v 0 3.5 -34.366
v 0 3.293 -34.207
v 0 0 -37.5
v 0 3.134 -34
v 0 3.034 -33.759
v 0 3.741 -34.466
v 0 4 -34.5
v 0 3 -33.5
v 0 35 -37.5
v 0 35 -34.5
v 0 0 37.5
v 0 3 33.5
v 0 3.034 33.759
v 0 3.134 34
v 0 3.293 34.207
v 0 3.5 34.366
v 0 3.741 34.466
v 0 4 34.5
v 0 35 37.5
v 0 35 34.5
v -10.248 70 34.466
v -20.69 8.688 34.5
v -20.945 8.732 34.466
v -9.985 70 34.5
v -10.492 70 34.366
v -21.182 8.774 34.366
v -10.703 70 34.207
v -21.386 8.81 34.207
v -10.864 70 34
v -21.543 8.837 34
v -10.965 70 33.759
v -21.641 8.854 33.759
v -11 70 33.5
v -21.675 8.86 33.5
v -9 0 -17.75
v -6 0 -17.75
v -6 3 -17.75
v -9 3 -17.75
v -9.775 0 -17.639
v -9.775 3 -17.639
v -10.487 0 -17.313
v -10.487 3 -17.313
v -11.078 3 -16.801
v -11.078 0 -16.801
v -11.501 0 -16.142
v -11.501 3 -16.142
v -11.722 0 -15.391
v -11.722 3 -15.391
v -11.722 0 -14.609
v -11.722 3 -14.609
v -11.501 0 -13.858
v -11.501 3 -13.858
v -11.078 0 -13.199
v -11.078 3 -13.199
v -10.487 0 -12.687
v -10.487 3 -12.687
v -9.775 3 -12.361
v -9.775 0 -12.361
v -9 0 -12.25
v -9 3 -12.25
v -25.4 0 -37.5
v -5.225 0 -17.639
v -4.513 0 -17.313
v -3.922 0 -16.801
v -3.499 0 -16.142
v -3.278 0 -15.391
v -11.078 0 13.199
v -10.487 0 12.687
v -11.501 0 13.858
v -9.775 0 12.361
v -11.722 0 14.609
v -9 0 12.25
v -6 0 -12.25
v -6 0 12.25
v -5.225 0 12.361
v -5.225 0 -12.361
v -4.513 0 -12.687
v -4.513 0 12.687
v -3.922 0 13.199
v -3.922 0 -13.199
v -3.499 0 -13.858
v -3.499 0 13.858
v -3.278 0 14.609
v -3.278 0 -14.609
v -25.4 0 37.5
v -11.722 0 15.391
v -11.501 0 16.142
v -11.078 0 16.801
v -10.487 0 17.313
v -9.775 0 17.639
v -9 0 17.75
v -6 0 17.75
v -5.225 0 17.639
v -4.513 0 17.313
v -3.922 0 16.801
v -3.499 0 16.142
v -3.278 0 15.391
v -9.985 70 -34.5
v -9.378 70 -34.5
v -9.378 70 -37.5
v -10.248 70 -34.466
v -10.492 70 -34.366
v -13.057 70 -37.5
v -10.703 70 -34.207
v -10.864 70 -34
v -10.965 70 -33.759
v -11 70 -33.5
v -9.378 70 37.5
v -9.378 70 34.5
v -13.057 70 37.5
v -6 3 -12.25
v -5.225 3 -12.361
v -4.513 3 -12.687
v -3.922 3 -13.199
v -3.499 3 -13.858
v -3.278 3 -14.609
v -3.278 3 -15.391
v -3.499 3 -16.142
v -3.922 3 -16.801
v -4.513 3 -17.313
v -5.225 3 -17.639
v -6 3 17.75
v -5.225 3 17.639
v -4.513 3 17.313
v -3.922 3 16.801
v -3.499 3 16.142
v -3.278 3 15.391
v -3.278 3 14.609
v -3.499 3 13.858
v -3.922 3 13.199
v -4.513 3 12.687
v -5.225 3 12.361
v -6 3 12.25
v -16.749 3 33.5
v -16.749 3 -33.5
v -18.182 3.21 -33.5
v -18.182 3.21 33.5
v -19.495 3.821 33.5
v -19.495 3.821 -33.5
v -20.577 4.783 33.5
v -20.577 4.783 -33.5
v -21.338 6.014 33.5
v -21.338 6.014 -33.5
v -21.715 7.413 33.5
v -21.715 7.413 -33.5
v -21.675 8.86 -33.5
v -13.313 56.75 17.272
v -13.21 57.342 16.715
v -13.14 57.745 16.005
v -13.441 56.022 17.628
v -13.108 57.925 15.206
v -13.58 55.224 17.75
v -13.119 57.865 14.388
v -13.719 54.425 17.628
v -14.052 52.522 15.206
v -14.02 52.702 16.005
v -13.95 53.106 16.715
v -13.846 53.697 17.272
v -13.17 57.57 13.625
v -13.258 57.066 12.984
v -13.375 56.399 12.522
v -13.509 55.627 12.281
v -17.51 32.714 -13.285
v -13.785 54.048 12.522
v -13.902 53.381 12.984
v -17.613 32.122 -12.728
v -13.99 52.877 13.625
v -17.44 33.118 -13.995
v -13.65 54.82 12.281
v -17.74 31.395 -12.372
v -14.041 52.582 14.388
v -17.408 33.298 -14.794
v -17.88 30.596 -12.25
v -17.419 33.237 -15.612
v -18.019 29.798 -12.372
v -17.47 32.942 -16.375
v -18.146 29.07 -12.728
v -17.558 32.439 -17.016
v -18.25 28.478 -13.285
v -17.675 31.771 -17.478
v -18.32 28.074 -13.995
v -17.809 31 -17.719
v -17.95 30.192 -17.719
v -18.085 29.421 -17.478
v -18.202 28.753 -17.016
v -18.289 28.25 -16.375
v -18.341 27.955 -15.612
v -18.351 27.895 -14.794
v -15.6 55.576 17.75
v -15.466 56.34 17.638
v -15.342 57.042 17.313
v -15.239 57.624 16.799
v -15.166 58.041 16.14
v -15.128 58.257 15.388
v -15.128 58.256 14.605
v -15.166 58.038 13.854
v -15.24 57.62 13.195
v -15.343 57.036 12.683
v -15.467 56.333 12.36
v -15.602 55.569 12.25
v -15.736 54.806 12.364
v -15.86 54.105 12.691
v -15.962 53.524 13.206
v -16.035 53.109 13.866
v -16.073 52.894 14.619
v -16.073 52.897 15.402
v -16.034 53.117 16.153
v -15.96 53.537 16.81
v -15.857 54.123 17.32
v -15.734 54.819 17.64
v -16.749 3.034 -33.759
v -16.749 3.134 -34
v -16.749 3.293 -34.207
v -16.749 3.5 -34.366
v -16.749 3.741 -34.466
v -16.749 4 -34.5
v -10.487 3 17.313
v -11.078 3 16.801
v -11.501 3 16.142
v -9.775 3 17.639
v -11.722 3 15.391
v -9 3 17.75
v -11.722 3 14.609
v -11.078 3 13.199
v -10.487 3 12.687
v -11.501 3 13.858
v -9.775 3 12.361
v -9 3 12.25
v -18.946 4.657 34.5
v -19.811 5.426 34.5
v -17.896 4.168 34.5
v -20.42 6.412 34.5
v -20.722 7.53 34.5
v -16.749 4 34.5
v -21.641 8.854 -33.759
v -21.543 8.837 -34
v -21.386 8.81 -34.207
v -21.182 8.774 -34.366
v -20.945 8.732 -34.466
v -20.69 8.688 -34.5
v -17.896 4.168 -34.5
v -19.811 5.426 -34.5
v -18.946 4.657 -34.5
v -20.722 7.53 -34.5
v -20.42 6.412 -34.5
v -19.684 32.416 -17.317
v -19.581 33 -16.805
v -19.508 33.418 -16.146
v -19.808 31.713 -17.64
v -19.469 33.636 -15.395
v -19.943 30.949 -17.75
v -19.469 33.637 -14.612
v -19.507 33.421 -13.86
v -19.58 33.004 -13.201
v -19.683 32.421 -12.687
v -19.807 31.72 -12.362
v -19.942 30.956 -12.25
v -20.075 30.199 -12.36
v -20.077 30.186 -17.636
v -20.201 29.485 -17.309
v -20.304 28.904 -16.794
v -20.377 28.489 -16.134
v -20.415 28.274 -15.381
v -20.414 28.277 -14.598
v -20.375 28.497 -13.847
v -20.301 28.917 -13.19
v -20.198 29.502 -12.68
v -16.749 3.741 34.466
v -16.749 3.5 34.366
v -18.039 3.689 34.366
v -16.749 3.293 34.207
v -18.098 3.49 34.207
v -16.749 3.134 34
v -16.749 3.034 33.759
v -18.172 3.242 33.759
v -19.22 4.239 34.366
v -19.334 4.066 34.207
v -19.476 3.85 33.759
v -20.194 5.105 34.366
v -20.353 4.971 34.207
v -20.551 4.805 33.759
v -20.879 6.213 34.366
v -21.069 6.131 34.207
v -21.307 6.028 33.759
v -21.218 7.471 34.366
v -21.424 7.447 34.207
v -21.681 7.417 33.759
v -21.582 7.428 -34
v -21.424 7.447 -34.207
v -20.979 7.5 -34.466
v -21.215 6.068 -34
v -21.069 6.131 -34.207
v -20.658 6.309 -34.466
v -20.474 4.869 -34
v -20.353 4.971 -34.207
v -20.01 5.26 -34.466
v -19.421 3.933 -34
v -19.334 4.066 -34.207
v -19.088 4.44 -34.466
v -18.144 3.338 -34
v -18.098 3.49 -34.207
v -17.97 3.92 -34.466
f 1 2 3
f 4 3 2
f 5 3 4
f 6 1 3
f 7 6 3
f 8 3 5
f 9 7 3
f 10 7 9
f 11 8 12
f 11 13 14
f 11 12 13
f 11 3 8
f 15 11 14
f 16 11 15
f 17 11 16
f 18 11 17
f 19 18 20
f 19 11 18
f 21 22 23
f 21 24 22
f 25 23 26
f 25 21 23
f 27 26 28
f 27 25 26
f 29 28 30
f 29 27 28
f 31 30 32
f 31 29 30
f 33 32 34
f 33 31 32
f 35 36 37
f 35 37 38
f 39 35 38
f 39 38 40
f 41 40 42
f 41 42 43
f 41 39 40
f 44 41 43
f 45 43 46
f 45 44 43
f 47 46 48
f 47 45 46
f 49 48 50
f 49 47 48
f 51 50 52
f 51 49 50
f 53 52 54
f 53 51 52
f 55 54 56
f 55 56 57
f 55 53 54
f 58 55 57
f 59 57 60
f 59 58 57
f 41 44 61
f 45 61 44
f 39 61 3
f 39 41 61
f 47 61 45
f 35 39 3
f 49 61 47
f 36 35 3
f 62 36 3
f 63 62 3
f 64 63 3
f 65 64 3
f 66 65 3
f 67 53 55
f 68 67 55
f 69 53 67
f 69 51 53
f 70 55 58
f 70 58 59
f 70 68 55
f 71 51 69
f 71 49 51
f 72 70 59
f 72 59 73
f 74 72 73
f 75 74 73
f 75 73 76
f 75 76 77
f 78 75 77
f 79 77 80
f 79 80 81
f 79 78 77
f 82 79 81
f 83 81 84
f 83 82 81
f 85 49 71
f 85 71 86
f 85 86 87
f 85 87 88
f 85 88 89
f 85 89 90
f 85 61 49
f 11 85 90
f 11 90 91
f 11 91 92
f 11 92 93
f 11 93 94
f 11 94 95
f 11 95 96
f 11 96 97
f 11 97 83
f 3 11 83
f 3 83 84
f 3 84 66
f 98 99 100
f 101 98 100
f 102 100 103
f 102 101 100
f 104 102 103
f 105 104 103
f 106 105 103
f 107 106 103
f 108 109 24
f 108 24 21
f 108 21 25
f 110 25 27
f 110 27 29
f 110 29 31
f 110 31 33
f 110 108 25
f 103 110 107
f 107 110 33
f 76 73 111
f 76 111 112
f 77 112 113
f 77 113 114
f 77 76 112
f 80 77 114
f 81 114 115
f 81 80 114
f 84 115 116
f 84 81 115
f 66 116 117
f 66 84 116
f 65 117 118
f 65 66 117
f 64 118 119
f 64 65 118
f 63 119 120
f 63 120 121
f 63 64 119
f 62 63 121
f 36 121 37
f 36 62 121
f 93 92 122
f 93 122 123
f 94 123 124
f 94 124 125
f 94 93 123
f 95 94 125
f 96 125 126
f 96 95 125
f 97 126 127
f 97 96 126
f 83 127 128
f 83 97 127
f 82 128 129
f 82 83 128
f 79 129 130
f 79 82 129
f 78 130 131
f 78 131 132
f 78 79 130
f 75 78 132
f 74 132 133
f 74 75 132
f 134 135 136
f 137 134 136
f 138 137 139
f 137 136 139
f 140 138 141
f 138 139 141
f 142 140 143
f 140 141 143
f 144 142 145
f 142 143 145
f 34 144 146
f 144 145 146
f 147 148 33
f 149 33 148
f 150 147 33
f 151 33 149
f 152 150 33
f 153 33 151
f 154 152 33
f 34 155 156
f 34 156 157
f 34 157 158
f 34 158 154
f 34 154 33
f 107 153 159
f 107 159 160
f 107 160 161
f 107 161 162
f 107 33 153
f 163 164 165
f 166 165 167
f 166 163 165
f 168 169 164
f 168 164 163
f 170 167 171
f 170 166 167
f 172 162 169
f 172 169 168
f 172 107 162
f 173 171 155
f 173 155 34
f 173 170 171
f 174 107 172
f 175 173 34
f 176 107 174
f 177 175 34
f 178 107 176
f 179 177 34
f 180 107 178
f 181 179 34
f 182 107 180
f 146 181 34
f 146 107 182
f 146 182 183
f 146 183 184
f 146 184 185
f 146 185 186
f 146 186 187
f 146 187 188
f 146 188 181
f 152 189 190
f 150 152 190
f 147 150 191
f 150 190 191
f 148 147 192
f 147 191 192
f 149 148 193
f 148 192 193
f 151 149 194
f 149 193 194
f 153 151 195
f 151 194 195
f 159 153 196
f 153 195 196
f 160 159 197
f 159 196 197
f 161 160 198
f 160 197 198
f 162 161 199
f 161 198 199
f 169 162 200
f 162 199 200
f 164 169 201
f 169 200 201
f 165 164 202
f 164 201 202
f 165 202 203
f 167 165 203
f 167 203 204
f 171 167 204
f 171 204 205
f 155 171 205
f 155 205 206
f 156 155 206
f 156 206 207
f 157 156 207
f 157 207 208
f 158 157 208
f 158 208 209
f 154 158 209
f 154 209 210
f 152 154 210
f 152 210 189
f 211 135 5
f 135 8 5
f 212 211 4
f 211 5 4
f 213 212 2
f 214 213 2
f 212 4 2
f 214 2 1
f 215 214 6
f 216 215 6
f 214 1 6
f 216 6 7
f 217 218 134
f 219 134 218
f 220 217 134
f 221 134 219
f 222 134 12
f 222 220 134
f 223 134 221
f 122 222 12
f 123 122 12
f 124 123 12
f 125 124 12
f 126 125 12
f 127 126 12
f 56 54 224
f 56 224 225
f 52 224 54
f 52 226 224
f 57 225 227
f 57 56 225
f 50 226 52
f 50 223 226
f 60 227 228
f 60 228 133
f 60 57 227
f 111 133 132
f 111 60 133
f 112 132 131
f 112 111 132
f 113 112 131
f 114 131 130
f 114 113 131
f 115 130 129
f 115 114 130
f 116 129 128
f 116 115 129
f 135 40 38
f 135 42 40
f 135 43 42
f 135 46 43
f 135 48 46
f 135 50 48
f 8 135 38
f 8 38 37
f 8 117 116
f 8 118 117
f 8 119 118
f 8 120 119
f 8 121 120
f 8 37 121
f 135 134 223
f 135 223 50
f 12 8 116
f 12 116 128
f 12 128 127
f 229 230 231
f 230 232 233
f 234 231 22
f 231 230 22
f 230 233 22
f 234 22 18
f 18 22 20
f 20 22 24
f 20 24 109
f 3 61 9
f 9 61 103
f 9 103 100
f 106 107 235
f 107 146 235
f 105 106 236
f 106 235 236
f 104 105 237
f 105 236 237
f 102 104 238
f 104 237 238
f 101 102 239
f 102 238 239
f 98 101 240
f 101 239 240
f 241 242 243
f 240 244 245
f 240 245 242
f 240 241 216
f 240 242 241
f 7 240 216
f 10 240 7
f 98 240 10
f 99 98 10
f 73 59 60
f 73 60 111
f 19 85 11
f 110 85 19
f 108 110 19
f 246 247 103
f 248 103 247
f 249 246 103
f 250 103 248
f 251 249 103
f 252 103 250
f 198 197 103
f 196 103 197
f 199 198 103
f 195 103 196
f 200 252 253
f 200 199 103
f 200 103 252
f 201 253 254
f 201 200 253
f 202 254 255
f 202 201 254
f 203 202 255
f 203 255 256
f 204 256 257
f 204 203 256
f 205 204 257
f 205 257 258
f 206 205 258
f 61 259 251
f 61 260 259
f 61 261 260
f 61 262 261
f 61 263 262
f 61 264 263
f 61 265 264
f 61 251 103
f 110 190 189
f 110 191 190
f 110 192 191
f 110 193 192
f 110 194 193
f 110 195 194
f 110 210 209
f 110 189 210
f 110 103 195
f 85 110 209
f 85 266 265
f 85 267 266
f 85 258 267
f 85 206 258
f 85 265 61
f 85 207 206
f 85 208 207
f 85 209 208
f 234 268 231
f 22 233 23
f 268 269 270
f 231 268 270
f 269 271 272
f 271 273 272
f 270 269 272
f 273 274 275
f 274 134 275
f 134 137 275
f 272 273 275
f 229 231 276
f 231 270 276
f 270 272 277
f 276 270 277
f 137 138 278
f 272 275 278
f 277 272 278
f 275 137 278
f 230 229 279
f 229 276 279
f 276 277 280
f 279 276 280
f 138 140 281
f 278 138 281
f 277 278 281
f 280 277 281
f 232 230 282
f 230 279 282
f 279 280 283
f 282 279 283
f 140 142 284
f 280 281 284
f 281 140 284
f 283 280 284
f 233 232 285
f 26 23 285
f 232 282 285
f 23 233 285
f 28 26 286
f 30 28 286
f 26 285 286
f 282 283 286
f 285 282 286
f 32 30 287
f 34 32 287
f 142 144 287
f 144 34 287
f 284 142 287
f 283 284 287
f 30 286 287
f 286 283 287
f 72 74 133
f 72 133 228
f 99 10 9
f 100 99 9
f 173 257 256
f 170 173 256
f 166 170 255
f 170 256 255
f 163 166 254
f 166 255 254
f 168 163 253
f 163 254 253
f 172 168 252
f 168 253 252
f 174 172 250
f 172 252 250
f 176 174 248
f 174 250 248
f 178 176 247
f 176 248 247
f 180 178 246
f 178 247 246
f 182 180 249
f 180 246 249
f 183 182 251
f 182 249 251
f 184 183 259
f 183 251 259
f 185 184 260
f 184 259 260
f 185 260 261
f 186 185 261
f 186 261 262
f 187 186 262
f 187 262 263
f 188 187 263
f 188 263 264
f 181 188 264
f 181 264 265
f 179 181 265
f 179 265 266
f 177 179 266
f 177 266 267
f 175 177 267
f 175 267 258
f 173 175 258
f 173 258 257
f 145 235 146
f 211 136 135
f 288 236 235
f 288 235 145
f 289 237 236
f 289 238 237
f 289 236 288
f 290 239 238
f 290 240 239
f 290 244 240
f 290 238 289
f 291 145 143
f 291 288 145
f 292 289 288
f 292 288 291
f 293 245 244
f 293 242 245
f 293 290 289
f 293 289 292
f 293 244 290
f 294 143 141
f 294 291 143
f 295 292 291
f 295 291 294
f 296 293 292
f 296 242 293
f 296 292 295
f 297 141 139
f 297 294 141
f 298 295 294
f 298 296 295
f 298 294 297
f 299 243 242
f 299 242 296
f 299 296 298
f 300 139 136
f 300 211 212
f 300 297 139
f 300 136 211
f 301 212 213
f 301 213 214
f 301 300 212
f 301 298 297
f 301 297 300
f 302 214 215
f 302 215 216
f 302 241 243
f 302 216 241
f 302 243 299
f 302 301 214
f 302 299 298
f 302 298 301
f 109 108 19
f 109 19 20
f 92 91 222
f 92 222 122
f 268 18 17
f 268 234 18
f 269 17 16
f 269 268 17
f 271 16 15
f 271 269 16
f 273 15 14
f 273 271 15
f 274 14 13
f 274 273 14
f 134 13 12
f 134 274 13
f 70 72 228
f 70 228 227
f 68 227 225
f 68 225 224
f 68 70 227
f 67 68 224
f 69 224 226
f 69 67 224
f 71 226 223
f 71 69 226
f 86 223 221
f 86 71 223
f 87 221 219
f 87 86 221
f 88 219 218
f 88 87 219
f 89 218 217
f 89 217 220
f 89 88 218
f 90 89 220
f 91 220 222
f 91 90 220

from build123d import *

# Parameters (mm, degrees)
BOSS_EXTRUDE1_DEPTH            = 37.5
SKETCH2_W                      = 11
SKETCH2_H                      = 69
CUT_EXTRUDE1_DEPTH             = 67
CUT_EXTRUDE2_REACH             = 94.575
CUT_EXTRUDE2_DIRECTION_2_REACH = 94.575
M5_CLEARANCE_SLOT1_DEPTH       = 3
M5_CLEARANCE_HOLE1_D           = 5.5
CHAMFER1_SIZE                  = 35
CHAMFER1_SIZE2                 = 9.378221735
FILLET1_R                      = 5
FILLET2_R                      = 1


# Read off the part's stored shape, not the designer's step: M5 Clearance Slot1
with BuildPart() as part:
    # Sketch1 → Boss-Extrude1 (new, symmetric)
    with BuildSketch(Plane.XY):
        Polygon((-13.05711135, 70), (-25.4, 0), (0, 0), (0, 70), align=None)
    extrude(amount=BOSS_EXTRUDE1_DEPTH, both=True)

    # Sketch2 → Cut-Extrude1 (cut)
    with BuildSketch(Plane(origin=(0, 70, 0), x_dir=(1, 0, 0), z_dir=(0, 1, 0))):
        with Locations((-5.5, 0)):
            Rectangle(SKETCH2_W, SKETCH2_H)
    extrude(amount=-CUT_EXTRUDE1_DEPTH, mode=Mode.SUBTRACT)

    # Cut-Extrude2: up to this face of the body (flat: up to its plane)
    cut_extrude2_end = Plane(part.part.faces().sort_by_distance((-5.5, 36.5, 34.5))[0])
    # Sketch6 → Cut-Extrude2 (cut, up to the picked face)
    with BuildSketch(Plane.XY.offset(17.5), mode=Mode.PRIVATE) as cut_extrude2_sk1:
        Polygon((-11, 70), (-22.697983939, 3), (-11, 3), align=None)
    cut_extrude2_tool1 = split(extrude(cut_extrude2_sk1.sketch, amount=CUT_EXTRUDE2_REACH, mode=Mode.PRIVATE), bisect_by=cut_extrude2_end, keep=Keep.BOTH, mode=Mode.PRIVATE)
    add(cut_extrude2_tool1.solids().sort_by(Axis((-14.899328, 25.333333, 17.5), (0, 0, 1)))[0], mode=Mode.SUBTRACT)

    # Cut-Extrude2 direction 2: up to this face of the body (flat: up to its plane)
    cut_extrude2_direction_2_end = Plane(part.part.faces().sort_by_distance((-5.5, 36.5, -34.5))[0])
    # Sketch6 → Cut-Extrude2 direction 2 (cut, up to the picked face)
    with BuildSketch(Plane.XY.offset(17.5), mode=Mode.PRIVATE) as cut_extrude2_direction_2_sk1:
        Polygon((-11, 70), (-22.697983939, 3), (-11, 3), align=None)
    cut_extrude2_direction_2_tool1 = split(extrude(cut_extrude2_direction_2_sk1.sketch, amount=-CUT_EXTRUDE2_DIRECTION_2_REACH, mode=Mode.PRIVATE), bisect_by=cut_extrude2_direction_2_end, keep=Keep.BOTH, mode=Mode.PRIVATE)
    add(cut_extrude2_direction_2_tool1.solids().sort_by(Axis((-14.899328, 25.333333, 17.5), (0, 0, -1)))[0], mode=Mode.SUBTRACT)

    # M5 Clearance Slot1 outline → M5 Clearance Slot1 (cut)
    with BuildSketch(Plane(origin=(0, 0, 0), x_dir=(1, 0, 0), z_dir=(0, 1, 0))):
        with BuildLine():
            Line((-9, 12.25), (-6, 12.25))
            ThreePointArc((-6, 12.25), (-3.25, 15), (-6, 17.75))
            Line((-6, 17.75), (-9, 17.75))
            ThreePointArc((-9, 17.75), (-11.75, 15), (-9, 12.25))
        make_face()
        with BuildLine():
            Line((-9, -17.75), (-6, -17.75))
            ThreePointArc((-6, -17.75), (-3.25, -15), (-6, -12.25))
            Line((-6, -12.25), (-9, -12.25))
            ThreePointArc((-9, -12.25), (-11.75, -15), (-9, -17.75))
        make_face()
    extrude(amount=M5_CLEARANCE_SLOT1_DEPTH, mode=Mode.SUBTRACT)

    # M5 Clearance Hole1 (through all)
    with Locations(Plane(origin=(-22.534821987, 3.934507249, 0), x_dir=(0, 0, -1), z_dir=(0.985097838962238, -0.17199490594761452, 0))):
        with Locations((-15, 52.064904762), (15, 27.064904762)):
            Hole(M5_CLEARANCE_HOLE1_D / 2)

    # Chamfer1
    chamfer1_edges = [part.edges().sort_by_distance(p)[0] for p in [
        (0, 70, -36),
        (0, 70, 36),
    ]]
    chamfer1_side = [part.faces().sort_by_distance(p)[0] for p in [
        (0, 1.025914226, 0),
    ]]
    chamfer(chamfer1_edges, length=CHAMFER1_SIZE, length2=CHAMFER1_SIZE2, reference=chamfer1_side[0])

    # Fillet1
    fillet1_edges = [part.edges().sort_by_distance(p)[0] for p in [
        (-22.697983939, 3, 0),
    ]]
    fillet(fillet1_edges, radius=FILLET1_R)

    # Fillet2
    fillet2_edges = [part.edges().sort_by_distance(p)[0] for p in [
        (-8.374681044, 3, -34.5),
        (-16.337425642, 39.429987265, -34.5),
        (-16.337425642, 39.429987265, 34.5),
        (-20.576885612, 4.782848515, -34.5),
        (-8.374681044, 3, 34.5),
        (-20.576885612, 4.782848515, 34.5),
    ]]
    fillet(fillet2_edges, radius=FILLET2_R)


solid = part.part
